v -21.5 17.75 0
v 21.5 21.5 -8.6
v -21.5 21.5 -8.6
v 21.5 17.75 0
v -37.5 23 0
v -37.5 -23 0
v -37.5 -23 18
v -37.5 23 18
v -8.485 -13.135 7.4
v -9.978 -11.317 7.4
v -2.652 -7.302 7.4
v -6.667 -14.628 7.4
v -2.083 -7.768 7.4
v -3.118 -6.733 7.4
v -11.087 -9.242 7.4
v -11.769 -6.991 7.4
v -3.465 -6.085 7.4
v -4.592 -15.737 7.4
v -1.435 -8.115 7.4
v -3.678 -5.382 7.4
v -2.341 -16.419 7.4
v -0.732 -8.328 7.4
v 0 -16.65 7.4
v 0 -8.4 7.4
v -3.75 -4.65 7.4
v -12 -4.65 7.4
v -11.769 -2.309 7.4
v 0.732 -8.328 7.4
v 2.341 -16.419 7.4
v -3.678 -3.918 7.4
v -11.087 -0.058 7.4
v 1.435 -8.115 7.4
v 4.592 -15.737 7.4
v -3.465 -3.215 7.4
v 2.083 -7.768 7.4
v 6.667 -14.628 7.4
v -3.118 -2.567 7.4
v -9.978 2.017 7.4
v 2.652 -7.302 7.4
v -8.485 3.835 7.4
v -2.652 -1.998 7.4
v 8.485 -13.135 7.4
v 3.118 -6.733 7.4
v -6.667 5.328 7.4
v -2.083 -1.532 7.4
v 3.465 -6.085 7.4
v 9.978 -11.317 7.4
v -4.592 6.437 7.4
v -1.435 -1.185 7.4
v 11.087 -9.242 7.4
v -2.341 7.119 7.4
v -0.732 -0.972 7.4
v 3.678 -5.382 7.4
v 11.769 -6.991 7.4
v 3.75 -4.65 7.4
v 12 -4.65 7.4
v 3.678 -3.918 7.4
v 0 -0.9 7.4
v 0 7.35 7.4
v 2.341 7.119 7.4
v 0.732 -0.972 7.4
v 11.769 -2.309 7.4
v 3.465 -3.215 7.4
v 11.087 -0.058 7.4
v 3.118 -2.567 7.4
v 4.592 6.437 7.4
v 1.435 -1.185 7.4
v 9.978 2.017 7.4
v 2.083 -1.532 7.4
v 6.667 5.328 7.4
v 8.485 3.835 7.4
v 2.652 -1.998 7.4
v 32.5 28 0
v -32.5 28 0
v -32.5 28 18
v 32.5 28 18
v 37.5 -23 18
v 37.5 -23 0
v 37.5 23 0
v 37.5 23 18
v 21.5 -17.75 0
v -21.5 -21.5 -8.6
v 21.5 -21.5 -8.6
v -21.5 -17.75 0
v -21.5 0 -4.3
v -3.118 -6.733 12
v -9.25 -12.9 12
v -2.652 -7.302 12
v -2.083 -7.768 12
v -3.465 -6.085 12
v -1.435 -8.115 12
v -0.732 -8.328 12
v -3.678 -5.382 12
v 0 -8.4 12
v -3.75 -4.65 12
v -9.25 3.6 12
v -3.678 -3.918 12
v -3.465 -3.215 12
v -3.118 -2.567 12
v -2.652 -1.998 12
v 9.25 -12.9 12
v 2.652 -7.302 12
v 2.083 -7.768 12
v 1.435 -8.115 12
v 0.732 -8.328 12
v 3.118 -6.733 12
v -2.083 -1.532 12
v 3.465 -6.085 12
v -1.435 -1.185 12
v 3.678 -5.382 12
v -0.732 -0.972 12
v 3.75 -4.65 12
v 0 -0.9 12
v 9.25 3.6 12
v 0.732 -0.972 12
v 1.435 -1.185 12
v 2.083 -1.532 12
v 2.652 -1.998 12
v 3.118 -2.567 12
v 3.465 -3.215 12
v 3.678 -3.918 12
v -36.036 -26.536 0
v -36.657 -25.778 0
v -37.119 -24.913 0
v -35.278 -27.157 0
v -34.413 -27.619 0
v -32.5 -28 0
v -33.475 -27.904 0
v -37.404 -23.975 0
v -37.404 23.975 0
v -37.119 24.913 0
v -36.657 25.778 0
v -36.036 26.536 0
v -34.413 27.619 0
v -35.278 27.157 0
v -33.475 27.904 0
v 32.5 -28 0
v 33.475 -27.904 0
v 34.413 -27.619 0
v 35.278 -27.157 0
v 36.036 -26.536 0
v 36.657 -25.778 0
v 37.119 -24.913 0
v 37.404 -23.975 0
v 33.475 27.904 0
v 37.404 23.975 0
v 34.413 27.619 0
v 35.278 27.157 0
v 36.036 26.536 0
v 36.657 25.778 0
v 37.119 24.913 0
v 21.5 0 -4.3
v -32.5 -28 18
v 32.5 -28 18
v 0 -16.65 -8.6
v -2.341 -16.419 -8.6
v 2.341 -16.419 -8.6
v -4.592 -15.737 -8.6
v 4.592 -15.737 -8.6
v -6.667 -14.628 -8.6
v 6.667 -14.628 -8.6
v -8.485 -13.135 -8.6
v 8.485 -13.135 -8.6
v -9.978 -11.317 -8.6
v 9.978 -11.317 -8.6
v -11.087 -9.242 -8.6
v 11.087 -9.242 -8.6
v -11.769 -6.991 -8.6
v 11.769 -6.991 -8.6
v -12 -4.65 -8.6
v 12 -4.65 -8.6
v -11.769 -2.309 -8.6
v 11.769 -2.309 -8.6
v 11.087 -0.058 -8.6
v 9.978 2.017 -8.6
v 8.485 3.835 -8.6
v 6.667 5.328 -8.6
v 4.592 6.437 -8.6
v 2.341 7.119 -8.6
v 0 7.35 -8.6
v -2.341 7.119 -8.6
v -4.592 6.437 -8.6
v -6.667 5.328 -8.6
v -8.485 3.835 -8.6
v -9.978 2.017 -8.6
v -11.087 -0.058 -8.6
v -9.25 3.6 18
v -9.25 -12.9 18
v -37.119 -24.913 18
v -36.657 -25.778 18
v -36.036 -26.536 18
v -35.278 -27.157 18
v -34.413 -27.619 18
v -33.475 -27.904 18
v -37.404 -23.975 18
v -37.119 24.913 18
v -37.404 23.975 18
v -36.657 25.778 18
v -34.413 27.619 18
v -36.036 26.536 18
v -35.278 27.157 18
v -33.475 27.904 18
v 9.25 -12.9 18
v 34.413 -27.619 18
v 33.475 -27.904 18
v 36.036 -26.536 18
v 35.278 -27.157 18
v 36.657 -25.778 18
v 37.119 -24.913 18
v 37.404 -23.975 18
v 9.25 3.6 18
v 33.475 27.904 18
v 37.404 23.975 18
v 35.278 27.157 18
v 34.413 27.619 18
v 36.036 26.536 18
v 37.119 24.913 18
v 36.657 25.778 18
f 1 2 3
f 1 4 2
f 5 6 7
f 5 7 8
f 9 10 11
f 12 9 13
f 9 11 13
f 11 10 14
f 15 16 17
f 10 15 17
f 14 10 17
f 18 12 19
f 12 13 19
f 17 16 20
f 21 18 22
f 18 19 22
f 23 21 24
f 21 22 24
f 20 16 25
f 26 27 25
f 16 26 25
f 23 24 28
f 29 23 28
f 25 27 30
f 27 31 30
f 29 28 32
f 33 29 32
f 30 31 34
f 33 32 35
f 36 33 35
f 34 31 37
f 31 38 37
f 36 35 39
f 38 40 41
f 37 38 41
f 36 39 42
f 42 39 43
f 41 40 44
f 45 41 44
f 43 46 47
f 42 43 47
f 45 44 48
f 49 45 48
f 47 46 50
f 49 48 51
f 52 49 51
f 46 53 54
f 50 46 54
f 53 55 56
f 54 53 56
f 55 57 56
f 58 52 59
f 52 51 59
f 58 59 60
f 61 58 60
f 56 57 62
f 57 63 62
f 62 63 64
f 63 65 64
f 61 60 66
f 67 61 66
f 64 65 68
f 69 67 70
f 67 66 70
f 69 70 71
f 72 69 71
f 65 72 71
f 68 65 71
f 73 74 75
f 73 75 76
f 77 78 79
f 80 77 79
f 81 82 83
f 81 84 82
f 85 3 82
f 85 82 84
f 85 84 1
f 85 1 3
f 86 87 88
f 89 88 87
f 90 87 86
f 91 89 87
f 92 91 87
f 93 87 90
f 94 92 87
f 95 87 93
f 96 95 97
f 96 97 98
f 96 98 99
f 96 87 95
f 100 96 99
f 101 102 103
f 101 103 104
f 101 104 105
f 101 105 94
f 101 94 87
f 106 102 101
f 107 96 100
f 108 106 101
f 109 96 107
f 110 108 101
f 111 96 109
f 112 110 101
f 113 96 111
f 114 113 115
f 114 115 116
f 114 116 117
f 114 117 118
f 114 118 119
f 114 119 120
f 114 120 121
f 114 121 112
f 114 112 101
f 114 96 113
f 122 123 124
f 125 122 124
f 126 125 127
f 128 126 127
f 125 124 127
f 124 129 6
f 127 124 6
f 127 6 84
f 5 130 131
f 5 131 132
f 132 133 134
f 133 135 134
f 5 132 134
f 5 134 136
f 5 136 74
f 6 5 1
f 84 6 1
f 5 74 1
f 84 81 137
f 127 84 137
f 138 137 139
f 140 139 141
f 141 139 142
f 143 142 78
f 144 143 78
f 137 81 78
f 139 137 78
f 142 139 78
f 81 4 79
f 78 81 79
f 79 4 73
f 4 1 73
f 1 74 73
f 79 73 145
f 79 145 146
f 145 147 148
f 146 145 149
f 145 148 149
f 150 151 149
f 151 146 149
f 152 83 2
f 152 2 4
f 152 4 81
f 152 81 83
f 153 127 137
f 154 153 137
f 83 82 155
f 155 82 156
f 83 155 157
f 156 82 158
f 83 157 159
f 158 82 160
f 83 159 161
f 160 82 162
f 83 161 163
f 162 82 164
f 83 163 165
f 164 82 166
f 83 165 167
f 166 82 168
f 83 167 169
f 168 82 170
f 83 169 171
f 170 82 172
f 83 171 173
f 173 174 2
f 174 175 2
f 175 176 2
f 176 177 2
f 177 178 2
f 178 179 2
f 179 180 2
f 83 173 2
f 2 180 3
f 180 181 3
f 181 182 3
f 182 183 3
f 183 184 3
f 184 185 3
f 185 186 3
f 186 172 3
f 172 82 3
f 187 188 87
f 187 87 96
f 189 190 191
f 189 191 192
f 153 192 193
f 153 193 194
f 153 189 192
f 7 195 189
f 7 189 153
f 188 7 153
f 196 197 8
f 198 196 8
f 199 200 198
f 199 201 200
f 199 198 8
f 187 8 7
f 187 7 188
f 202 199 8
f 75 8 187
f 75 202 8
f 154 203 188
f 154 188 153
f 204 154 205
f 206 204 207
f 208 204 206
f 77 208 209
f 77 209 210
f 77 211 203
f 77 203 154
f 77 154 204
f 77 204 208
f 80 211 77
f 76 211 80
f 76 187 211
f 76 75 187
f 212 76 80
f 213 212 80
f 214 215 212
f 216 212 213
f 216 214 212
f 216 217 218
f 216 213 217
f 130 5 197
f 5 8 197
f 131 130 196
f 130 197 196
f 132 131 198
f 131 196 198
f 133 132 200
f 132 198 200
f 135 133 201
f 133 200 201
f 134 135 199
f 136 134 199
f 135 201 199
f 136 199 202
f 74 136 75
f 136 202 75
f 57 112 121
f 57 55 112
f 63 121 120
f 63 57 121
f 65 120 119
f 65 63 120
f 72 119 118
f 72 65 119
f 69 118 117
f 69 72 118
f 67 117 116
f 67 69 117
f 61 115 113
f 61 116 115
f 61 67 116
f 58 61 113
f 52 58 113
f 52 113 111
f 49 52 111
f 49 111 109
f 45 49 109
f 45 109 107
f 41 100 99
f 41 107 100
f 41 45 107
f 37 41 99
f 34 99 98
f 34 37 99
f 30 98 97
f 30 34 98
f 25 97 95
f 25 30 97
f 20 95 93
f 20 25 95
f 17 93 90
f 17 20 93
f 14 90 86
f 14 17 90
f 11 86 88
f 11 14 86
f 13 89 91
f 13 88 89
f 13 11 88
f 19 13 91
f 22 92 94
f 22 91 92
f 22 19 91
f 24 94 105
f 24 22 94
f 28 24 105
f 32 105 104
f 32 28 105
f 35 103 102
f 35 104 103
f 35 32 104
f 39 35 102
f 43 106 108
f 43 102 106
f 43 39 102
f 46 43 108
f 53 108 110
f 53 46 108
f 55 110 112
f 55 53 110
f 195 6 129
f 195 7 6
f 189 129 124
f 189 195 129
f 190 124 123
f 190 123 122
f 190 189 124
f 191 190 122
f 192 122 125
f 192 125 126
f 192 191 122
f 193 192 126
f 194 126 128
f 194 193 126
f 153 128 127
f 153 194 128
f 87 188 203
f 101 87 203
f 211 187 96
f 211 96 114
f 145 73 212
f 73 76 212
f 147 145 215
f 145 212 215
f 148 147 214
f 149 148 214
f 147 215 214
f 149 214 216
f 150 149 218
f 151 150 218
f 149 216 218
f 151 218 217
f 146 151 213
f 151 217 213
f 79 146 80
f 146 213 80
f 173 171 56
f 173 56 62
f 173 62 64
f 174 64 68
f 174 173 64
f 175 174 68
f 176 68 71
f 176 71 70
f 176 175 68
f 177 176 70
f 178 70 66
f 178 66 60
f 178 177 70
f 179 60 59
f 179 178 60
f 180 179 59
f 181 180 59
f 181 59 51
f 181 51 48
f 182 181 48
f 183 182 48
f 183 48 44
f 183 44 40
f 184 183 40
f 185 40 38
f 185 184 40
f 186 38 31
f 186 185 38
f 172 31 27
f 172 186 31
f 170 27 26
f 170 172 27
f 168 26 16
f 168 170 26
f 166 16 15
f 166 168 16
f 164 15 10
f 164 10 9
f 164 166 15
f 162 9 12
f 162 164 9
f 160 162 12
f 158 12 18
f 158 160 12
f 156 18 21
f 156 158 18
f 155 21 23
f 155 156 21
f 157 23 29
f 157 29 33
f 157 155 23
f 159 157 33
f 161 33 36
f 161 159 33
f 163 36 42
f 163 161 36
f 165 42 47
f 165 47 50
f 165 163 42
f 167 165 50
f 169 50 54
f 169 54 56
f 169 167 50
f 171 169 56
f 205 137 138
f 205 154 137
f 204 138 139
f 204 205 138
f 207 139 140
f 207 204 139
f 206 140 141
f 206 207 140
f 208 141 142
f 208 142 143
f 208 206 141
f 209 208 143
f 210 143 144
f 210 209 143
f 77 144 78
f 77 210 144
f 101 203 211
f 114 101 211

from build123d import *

# Parameters (mm, degrees)
F3_W           = 43
F3_H           = 43
F4_W           = 43
F4_H           = 35.5
F6_W           = 75
F6_H           = 56
F7_DEPTH       = 18
F8_R           = 5
F9_R           = 3.75
F10_DEPTH      = 8.6
F10_DEPTH_BACK = 18
F11_R          = 12
F12_DEPTH      = 16
F13_W          = 18.5
F13_H          = 16.5
F14_DEPTH      = 6


with BuildPart() as f5:
    # F3 (on offset) → F5 section 0
    with BuildSketch(Plane.XY.offset(-8.6)):
        Rectangle(F3_W, F3_H)
    # F4 (on Top) → F5 section 1
    with BuildSketch(Plane.XY):
        Rectangle(F4_W, F4_H)
    loft()

    # F6 (on Top) → F7 (join)
    with BuildSketch(Plane.XY):
        Rectangle(F6_W, F6_H)
    extrude(amount=F7_DEPTH)

    # F8
    f8_edges = [f5.edges().sort_by_distance(p)[0] for p in [
        (-37.5, 28, 9),
        (37.5, 28, 9),
        (37.5, -28, 9),
        (-37.5, -28, 9),
    ]]
    fillet(f8_edges, radius=F8_R)

    # F9 (on Top) → F10 (cut, two sides)
    with BuildSketch(Plane.XY) as f10_sk:
        with Locations((0, -4.65)):
            Circle(F9_R)
    extrude(amount=-F10_DEPTH, mode=Mode.SUBTRACT)
    extrude(f10_sk.sketch, amount=F10_DEPTH_BACK, mode=Mode.SUBTRACT)

    # F11 (on offset) → F12 (cut)
    with BuildSketch(Plane.XY.offset(-8.6)):
        with Locations((0, -4.65)):
            Circle(F11_R)
    extrude(amount=F12_DEPTH, mode=Mode.SUBTRACT)

    # F13 (on face) → F14 (cut)
    with BuildSketch(Plane.XY.offset(18)):
        with Locations((0, -4.65)):
            Rectangle(F13_W, F13_H)
    extrude(amount=-F14_DEPTH, mode=Mode.SUBTRACT)


solid = f5.part
